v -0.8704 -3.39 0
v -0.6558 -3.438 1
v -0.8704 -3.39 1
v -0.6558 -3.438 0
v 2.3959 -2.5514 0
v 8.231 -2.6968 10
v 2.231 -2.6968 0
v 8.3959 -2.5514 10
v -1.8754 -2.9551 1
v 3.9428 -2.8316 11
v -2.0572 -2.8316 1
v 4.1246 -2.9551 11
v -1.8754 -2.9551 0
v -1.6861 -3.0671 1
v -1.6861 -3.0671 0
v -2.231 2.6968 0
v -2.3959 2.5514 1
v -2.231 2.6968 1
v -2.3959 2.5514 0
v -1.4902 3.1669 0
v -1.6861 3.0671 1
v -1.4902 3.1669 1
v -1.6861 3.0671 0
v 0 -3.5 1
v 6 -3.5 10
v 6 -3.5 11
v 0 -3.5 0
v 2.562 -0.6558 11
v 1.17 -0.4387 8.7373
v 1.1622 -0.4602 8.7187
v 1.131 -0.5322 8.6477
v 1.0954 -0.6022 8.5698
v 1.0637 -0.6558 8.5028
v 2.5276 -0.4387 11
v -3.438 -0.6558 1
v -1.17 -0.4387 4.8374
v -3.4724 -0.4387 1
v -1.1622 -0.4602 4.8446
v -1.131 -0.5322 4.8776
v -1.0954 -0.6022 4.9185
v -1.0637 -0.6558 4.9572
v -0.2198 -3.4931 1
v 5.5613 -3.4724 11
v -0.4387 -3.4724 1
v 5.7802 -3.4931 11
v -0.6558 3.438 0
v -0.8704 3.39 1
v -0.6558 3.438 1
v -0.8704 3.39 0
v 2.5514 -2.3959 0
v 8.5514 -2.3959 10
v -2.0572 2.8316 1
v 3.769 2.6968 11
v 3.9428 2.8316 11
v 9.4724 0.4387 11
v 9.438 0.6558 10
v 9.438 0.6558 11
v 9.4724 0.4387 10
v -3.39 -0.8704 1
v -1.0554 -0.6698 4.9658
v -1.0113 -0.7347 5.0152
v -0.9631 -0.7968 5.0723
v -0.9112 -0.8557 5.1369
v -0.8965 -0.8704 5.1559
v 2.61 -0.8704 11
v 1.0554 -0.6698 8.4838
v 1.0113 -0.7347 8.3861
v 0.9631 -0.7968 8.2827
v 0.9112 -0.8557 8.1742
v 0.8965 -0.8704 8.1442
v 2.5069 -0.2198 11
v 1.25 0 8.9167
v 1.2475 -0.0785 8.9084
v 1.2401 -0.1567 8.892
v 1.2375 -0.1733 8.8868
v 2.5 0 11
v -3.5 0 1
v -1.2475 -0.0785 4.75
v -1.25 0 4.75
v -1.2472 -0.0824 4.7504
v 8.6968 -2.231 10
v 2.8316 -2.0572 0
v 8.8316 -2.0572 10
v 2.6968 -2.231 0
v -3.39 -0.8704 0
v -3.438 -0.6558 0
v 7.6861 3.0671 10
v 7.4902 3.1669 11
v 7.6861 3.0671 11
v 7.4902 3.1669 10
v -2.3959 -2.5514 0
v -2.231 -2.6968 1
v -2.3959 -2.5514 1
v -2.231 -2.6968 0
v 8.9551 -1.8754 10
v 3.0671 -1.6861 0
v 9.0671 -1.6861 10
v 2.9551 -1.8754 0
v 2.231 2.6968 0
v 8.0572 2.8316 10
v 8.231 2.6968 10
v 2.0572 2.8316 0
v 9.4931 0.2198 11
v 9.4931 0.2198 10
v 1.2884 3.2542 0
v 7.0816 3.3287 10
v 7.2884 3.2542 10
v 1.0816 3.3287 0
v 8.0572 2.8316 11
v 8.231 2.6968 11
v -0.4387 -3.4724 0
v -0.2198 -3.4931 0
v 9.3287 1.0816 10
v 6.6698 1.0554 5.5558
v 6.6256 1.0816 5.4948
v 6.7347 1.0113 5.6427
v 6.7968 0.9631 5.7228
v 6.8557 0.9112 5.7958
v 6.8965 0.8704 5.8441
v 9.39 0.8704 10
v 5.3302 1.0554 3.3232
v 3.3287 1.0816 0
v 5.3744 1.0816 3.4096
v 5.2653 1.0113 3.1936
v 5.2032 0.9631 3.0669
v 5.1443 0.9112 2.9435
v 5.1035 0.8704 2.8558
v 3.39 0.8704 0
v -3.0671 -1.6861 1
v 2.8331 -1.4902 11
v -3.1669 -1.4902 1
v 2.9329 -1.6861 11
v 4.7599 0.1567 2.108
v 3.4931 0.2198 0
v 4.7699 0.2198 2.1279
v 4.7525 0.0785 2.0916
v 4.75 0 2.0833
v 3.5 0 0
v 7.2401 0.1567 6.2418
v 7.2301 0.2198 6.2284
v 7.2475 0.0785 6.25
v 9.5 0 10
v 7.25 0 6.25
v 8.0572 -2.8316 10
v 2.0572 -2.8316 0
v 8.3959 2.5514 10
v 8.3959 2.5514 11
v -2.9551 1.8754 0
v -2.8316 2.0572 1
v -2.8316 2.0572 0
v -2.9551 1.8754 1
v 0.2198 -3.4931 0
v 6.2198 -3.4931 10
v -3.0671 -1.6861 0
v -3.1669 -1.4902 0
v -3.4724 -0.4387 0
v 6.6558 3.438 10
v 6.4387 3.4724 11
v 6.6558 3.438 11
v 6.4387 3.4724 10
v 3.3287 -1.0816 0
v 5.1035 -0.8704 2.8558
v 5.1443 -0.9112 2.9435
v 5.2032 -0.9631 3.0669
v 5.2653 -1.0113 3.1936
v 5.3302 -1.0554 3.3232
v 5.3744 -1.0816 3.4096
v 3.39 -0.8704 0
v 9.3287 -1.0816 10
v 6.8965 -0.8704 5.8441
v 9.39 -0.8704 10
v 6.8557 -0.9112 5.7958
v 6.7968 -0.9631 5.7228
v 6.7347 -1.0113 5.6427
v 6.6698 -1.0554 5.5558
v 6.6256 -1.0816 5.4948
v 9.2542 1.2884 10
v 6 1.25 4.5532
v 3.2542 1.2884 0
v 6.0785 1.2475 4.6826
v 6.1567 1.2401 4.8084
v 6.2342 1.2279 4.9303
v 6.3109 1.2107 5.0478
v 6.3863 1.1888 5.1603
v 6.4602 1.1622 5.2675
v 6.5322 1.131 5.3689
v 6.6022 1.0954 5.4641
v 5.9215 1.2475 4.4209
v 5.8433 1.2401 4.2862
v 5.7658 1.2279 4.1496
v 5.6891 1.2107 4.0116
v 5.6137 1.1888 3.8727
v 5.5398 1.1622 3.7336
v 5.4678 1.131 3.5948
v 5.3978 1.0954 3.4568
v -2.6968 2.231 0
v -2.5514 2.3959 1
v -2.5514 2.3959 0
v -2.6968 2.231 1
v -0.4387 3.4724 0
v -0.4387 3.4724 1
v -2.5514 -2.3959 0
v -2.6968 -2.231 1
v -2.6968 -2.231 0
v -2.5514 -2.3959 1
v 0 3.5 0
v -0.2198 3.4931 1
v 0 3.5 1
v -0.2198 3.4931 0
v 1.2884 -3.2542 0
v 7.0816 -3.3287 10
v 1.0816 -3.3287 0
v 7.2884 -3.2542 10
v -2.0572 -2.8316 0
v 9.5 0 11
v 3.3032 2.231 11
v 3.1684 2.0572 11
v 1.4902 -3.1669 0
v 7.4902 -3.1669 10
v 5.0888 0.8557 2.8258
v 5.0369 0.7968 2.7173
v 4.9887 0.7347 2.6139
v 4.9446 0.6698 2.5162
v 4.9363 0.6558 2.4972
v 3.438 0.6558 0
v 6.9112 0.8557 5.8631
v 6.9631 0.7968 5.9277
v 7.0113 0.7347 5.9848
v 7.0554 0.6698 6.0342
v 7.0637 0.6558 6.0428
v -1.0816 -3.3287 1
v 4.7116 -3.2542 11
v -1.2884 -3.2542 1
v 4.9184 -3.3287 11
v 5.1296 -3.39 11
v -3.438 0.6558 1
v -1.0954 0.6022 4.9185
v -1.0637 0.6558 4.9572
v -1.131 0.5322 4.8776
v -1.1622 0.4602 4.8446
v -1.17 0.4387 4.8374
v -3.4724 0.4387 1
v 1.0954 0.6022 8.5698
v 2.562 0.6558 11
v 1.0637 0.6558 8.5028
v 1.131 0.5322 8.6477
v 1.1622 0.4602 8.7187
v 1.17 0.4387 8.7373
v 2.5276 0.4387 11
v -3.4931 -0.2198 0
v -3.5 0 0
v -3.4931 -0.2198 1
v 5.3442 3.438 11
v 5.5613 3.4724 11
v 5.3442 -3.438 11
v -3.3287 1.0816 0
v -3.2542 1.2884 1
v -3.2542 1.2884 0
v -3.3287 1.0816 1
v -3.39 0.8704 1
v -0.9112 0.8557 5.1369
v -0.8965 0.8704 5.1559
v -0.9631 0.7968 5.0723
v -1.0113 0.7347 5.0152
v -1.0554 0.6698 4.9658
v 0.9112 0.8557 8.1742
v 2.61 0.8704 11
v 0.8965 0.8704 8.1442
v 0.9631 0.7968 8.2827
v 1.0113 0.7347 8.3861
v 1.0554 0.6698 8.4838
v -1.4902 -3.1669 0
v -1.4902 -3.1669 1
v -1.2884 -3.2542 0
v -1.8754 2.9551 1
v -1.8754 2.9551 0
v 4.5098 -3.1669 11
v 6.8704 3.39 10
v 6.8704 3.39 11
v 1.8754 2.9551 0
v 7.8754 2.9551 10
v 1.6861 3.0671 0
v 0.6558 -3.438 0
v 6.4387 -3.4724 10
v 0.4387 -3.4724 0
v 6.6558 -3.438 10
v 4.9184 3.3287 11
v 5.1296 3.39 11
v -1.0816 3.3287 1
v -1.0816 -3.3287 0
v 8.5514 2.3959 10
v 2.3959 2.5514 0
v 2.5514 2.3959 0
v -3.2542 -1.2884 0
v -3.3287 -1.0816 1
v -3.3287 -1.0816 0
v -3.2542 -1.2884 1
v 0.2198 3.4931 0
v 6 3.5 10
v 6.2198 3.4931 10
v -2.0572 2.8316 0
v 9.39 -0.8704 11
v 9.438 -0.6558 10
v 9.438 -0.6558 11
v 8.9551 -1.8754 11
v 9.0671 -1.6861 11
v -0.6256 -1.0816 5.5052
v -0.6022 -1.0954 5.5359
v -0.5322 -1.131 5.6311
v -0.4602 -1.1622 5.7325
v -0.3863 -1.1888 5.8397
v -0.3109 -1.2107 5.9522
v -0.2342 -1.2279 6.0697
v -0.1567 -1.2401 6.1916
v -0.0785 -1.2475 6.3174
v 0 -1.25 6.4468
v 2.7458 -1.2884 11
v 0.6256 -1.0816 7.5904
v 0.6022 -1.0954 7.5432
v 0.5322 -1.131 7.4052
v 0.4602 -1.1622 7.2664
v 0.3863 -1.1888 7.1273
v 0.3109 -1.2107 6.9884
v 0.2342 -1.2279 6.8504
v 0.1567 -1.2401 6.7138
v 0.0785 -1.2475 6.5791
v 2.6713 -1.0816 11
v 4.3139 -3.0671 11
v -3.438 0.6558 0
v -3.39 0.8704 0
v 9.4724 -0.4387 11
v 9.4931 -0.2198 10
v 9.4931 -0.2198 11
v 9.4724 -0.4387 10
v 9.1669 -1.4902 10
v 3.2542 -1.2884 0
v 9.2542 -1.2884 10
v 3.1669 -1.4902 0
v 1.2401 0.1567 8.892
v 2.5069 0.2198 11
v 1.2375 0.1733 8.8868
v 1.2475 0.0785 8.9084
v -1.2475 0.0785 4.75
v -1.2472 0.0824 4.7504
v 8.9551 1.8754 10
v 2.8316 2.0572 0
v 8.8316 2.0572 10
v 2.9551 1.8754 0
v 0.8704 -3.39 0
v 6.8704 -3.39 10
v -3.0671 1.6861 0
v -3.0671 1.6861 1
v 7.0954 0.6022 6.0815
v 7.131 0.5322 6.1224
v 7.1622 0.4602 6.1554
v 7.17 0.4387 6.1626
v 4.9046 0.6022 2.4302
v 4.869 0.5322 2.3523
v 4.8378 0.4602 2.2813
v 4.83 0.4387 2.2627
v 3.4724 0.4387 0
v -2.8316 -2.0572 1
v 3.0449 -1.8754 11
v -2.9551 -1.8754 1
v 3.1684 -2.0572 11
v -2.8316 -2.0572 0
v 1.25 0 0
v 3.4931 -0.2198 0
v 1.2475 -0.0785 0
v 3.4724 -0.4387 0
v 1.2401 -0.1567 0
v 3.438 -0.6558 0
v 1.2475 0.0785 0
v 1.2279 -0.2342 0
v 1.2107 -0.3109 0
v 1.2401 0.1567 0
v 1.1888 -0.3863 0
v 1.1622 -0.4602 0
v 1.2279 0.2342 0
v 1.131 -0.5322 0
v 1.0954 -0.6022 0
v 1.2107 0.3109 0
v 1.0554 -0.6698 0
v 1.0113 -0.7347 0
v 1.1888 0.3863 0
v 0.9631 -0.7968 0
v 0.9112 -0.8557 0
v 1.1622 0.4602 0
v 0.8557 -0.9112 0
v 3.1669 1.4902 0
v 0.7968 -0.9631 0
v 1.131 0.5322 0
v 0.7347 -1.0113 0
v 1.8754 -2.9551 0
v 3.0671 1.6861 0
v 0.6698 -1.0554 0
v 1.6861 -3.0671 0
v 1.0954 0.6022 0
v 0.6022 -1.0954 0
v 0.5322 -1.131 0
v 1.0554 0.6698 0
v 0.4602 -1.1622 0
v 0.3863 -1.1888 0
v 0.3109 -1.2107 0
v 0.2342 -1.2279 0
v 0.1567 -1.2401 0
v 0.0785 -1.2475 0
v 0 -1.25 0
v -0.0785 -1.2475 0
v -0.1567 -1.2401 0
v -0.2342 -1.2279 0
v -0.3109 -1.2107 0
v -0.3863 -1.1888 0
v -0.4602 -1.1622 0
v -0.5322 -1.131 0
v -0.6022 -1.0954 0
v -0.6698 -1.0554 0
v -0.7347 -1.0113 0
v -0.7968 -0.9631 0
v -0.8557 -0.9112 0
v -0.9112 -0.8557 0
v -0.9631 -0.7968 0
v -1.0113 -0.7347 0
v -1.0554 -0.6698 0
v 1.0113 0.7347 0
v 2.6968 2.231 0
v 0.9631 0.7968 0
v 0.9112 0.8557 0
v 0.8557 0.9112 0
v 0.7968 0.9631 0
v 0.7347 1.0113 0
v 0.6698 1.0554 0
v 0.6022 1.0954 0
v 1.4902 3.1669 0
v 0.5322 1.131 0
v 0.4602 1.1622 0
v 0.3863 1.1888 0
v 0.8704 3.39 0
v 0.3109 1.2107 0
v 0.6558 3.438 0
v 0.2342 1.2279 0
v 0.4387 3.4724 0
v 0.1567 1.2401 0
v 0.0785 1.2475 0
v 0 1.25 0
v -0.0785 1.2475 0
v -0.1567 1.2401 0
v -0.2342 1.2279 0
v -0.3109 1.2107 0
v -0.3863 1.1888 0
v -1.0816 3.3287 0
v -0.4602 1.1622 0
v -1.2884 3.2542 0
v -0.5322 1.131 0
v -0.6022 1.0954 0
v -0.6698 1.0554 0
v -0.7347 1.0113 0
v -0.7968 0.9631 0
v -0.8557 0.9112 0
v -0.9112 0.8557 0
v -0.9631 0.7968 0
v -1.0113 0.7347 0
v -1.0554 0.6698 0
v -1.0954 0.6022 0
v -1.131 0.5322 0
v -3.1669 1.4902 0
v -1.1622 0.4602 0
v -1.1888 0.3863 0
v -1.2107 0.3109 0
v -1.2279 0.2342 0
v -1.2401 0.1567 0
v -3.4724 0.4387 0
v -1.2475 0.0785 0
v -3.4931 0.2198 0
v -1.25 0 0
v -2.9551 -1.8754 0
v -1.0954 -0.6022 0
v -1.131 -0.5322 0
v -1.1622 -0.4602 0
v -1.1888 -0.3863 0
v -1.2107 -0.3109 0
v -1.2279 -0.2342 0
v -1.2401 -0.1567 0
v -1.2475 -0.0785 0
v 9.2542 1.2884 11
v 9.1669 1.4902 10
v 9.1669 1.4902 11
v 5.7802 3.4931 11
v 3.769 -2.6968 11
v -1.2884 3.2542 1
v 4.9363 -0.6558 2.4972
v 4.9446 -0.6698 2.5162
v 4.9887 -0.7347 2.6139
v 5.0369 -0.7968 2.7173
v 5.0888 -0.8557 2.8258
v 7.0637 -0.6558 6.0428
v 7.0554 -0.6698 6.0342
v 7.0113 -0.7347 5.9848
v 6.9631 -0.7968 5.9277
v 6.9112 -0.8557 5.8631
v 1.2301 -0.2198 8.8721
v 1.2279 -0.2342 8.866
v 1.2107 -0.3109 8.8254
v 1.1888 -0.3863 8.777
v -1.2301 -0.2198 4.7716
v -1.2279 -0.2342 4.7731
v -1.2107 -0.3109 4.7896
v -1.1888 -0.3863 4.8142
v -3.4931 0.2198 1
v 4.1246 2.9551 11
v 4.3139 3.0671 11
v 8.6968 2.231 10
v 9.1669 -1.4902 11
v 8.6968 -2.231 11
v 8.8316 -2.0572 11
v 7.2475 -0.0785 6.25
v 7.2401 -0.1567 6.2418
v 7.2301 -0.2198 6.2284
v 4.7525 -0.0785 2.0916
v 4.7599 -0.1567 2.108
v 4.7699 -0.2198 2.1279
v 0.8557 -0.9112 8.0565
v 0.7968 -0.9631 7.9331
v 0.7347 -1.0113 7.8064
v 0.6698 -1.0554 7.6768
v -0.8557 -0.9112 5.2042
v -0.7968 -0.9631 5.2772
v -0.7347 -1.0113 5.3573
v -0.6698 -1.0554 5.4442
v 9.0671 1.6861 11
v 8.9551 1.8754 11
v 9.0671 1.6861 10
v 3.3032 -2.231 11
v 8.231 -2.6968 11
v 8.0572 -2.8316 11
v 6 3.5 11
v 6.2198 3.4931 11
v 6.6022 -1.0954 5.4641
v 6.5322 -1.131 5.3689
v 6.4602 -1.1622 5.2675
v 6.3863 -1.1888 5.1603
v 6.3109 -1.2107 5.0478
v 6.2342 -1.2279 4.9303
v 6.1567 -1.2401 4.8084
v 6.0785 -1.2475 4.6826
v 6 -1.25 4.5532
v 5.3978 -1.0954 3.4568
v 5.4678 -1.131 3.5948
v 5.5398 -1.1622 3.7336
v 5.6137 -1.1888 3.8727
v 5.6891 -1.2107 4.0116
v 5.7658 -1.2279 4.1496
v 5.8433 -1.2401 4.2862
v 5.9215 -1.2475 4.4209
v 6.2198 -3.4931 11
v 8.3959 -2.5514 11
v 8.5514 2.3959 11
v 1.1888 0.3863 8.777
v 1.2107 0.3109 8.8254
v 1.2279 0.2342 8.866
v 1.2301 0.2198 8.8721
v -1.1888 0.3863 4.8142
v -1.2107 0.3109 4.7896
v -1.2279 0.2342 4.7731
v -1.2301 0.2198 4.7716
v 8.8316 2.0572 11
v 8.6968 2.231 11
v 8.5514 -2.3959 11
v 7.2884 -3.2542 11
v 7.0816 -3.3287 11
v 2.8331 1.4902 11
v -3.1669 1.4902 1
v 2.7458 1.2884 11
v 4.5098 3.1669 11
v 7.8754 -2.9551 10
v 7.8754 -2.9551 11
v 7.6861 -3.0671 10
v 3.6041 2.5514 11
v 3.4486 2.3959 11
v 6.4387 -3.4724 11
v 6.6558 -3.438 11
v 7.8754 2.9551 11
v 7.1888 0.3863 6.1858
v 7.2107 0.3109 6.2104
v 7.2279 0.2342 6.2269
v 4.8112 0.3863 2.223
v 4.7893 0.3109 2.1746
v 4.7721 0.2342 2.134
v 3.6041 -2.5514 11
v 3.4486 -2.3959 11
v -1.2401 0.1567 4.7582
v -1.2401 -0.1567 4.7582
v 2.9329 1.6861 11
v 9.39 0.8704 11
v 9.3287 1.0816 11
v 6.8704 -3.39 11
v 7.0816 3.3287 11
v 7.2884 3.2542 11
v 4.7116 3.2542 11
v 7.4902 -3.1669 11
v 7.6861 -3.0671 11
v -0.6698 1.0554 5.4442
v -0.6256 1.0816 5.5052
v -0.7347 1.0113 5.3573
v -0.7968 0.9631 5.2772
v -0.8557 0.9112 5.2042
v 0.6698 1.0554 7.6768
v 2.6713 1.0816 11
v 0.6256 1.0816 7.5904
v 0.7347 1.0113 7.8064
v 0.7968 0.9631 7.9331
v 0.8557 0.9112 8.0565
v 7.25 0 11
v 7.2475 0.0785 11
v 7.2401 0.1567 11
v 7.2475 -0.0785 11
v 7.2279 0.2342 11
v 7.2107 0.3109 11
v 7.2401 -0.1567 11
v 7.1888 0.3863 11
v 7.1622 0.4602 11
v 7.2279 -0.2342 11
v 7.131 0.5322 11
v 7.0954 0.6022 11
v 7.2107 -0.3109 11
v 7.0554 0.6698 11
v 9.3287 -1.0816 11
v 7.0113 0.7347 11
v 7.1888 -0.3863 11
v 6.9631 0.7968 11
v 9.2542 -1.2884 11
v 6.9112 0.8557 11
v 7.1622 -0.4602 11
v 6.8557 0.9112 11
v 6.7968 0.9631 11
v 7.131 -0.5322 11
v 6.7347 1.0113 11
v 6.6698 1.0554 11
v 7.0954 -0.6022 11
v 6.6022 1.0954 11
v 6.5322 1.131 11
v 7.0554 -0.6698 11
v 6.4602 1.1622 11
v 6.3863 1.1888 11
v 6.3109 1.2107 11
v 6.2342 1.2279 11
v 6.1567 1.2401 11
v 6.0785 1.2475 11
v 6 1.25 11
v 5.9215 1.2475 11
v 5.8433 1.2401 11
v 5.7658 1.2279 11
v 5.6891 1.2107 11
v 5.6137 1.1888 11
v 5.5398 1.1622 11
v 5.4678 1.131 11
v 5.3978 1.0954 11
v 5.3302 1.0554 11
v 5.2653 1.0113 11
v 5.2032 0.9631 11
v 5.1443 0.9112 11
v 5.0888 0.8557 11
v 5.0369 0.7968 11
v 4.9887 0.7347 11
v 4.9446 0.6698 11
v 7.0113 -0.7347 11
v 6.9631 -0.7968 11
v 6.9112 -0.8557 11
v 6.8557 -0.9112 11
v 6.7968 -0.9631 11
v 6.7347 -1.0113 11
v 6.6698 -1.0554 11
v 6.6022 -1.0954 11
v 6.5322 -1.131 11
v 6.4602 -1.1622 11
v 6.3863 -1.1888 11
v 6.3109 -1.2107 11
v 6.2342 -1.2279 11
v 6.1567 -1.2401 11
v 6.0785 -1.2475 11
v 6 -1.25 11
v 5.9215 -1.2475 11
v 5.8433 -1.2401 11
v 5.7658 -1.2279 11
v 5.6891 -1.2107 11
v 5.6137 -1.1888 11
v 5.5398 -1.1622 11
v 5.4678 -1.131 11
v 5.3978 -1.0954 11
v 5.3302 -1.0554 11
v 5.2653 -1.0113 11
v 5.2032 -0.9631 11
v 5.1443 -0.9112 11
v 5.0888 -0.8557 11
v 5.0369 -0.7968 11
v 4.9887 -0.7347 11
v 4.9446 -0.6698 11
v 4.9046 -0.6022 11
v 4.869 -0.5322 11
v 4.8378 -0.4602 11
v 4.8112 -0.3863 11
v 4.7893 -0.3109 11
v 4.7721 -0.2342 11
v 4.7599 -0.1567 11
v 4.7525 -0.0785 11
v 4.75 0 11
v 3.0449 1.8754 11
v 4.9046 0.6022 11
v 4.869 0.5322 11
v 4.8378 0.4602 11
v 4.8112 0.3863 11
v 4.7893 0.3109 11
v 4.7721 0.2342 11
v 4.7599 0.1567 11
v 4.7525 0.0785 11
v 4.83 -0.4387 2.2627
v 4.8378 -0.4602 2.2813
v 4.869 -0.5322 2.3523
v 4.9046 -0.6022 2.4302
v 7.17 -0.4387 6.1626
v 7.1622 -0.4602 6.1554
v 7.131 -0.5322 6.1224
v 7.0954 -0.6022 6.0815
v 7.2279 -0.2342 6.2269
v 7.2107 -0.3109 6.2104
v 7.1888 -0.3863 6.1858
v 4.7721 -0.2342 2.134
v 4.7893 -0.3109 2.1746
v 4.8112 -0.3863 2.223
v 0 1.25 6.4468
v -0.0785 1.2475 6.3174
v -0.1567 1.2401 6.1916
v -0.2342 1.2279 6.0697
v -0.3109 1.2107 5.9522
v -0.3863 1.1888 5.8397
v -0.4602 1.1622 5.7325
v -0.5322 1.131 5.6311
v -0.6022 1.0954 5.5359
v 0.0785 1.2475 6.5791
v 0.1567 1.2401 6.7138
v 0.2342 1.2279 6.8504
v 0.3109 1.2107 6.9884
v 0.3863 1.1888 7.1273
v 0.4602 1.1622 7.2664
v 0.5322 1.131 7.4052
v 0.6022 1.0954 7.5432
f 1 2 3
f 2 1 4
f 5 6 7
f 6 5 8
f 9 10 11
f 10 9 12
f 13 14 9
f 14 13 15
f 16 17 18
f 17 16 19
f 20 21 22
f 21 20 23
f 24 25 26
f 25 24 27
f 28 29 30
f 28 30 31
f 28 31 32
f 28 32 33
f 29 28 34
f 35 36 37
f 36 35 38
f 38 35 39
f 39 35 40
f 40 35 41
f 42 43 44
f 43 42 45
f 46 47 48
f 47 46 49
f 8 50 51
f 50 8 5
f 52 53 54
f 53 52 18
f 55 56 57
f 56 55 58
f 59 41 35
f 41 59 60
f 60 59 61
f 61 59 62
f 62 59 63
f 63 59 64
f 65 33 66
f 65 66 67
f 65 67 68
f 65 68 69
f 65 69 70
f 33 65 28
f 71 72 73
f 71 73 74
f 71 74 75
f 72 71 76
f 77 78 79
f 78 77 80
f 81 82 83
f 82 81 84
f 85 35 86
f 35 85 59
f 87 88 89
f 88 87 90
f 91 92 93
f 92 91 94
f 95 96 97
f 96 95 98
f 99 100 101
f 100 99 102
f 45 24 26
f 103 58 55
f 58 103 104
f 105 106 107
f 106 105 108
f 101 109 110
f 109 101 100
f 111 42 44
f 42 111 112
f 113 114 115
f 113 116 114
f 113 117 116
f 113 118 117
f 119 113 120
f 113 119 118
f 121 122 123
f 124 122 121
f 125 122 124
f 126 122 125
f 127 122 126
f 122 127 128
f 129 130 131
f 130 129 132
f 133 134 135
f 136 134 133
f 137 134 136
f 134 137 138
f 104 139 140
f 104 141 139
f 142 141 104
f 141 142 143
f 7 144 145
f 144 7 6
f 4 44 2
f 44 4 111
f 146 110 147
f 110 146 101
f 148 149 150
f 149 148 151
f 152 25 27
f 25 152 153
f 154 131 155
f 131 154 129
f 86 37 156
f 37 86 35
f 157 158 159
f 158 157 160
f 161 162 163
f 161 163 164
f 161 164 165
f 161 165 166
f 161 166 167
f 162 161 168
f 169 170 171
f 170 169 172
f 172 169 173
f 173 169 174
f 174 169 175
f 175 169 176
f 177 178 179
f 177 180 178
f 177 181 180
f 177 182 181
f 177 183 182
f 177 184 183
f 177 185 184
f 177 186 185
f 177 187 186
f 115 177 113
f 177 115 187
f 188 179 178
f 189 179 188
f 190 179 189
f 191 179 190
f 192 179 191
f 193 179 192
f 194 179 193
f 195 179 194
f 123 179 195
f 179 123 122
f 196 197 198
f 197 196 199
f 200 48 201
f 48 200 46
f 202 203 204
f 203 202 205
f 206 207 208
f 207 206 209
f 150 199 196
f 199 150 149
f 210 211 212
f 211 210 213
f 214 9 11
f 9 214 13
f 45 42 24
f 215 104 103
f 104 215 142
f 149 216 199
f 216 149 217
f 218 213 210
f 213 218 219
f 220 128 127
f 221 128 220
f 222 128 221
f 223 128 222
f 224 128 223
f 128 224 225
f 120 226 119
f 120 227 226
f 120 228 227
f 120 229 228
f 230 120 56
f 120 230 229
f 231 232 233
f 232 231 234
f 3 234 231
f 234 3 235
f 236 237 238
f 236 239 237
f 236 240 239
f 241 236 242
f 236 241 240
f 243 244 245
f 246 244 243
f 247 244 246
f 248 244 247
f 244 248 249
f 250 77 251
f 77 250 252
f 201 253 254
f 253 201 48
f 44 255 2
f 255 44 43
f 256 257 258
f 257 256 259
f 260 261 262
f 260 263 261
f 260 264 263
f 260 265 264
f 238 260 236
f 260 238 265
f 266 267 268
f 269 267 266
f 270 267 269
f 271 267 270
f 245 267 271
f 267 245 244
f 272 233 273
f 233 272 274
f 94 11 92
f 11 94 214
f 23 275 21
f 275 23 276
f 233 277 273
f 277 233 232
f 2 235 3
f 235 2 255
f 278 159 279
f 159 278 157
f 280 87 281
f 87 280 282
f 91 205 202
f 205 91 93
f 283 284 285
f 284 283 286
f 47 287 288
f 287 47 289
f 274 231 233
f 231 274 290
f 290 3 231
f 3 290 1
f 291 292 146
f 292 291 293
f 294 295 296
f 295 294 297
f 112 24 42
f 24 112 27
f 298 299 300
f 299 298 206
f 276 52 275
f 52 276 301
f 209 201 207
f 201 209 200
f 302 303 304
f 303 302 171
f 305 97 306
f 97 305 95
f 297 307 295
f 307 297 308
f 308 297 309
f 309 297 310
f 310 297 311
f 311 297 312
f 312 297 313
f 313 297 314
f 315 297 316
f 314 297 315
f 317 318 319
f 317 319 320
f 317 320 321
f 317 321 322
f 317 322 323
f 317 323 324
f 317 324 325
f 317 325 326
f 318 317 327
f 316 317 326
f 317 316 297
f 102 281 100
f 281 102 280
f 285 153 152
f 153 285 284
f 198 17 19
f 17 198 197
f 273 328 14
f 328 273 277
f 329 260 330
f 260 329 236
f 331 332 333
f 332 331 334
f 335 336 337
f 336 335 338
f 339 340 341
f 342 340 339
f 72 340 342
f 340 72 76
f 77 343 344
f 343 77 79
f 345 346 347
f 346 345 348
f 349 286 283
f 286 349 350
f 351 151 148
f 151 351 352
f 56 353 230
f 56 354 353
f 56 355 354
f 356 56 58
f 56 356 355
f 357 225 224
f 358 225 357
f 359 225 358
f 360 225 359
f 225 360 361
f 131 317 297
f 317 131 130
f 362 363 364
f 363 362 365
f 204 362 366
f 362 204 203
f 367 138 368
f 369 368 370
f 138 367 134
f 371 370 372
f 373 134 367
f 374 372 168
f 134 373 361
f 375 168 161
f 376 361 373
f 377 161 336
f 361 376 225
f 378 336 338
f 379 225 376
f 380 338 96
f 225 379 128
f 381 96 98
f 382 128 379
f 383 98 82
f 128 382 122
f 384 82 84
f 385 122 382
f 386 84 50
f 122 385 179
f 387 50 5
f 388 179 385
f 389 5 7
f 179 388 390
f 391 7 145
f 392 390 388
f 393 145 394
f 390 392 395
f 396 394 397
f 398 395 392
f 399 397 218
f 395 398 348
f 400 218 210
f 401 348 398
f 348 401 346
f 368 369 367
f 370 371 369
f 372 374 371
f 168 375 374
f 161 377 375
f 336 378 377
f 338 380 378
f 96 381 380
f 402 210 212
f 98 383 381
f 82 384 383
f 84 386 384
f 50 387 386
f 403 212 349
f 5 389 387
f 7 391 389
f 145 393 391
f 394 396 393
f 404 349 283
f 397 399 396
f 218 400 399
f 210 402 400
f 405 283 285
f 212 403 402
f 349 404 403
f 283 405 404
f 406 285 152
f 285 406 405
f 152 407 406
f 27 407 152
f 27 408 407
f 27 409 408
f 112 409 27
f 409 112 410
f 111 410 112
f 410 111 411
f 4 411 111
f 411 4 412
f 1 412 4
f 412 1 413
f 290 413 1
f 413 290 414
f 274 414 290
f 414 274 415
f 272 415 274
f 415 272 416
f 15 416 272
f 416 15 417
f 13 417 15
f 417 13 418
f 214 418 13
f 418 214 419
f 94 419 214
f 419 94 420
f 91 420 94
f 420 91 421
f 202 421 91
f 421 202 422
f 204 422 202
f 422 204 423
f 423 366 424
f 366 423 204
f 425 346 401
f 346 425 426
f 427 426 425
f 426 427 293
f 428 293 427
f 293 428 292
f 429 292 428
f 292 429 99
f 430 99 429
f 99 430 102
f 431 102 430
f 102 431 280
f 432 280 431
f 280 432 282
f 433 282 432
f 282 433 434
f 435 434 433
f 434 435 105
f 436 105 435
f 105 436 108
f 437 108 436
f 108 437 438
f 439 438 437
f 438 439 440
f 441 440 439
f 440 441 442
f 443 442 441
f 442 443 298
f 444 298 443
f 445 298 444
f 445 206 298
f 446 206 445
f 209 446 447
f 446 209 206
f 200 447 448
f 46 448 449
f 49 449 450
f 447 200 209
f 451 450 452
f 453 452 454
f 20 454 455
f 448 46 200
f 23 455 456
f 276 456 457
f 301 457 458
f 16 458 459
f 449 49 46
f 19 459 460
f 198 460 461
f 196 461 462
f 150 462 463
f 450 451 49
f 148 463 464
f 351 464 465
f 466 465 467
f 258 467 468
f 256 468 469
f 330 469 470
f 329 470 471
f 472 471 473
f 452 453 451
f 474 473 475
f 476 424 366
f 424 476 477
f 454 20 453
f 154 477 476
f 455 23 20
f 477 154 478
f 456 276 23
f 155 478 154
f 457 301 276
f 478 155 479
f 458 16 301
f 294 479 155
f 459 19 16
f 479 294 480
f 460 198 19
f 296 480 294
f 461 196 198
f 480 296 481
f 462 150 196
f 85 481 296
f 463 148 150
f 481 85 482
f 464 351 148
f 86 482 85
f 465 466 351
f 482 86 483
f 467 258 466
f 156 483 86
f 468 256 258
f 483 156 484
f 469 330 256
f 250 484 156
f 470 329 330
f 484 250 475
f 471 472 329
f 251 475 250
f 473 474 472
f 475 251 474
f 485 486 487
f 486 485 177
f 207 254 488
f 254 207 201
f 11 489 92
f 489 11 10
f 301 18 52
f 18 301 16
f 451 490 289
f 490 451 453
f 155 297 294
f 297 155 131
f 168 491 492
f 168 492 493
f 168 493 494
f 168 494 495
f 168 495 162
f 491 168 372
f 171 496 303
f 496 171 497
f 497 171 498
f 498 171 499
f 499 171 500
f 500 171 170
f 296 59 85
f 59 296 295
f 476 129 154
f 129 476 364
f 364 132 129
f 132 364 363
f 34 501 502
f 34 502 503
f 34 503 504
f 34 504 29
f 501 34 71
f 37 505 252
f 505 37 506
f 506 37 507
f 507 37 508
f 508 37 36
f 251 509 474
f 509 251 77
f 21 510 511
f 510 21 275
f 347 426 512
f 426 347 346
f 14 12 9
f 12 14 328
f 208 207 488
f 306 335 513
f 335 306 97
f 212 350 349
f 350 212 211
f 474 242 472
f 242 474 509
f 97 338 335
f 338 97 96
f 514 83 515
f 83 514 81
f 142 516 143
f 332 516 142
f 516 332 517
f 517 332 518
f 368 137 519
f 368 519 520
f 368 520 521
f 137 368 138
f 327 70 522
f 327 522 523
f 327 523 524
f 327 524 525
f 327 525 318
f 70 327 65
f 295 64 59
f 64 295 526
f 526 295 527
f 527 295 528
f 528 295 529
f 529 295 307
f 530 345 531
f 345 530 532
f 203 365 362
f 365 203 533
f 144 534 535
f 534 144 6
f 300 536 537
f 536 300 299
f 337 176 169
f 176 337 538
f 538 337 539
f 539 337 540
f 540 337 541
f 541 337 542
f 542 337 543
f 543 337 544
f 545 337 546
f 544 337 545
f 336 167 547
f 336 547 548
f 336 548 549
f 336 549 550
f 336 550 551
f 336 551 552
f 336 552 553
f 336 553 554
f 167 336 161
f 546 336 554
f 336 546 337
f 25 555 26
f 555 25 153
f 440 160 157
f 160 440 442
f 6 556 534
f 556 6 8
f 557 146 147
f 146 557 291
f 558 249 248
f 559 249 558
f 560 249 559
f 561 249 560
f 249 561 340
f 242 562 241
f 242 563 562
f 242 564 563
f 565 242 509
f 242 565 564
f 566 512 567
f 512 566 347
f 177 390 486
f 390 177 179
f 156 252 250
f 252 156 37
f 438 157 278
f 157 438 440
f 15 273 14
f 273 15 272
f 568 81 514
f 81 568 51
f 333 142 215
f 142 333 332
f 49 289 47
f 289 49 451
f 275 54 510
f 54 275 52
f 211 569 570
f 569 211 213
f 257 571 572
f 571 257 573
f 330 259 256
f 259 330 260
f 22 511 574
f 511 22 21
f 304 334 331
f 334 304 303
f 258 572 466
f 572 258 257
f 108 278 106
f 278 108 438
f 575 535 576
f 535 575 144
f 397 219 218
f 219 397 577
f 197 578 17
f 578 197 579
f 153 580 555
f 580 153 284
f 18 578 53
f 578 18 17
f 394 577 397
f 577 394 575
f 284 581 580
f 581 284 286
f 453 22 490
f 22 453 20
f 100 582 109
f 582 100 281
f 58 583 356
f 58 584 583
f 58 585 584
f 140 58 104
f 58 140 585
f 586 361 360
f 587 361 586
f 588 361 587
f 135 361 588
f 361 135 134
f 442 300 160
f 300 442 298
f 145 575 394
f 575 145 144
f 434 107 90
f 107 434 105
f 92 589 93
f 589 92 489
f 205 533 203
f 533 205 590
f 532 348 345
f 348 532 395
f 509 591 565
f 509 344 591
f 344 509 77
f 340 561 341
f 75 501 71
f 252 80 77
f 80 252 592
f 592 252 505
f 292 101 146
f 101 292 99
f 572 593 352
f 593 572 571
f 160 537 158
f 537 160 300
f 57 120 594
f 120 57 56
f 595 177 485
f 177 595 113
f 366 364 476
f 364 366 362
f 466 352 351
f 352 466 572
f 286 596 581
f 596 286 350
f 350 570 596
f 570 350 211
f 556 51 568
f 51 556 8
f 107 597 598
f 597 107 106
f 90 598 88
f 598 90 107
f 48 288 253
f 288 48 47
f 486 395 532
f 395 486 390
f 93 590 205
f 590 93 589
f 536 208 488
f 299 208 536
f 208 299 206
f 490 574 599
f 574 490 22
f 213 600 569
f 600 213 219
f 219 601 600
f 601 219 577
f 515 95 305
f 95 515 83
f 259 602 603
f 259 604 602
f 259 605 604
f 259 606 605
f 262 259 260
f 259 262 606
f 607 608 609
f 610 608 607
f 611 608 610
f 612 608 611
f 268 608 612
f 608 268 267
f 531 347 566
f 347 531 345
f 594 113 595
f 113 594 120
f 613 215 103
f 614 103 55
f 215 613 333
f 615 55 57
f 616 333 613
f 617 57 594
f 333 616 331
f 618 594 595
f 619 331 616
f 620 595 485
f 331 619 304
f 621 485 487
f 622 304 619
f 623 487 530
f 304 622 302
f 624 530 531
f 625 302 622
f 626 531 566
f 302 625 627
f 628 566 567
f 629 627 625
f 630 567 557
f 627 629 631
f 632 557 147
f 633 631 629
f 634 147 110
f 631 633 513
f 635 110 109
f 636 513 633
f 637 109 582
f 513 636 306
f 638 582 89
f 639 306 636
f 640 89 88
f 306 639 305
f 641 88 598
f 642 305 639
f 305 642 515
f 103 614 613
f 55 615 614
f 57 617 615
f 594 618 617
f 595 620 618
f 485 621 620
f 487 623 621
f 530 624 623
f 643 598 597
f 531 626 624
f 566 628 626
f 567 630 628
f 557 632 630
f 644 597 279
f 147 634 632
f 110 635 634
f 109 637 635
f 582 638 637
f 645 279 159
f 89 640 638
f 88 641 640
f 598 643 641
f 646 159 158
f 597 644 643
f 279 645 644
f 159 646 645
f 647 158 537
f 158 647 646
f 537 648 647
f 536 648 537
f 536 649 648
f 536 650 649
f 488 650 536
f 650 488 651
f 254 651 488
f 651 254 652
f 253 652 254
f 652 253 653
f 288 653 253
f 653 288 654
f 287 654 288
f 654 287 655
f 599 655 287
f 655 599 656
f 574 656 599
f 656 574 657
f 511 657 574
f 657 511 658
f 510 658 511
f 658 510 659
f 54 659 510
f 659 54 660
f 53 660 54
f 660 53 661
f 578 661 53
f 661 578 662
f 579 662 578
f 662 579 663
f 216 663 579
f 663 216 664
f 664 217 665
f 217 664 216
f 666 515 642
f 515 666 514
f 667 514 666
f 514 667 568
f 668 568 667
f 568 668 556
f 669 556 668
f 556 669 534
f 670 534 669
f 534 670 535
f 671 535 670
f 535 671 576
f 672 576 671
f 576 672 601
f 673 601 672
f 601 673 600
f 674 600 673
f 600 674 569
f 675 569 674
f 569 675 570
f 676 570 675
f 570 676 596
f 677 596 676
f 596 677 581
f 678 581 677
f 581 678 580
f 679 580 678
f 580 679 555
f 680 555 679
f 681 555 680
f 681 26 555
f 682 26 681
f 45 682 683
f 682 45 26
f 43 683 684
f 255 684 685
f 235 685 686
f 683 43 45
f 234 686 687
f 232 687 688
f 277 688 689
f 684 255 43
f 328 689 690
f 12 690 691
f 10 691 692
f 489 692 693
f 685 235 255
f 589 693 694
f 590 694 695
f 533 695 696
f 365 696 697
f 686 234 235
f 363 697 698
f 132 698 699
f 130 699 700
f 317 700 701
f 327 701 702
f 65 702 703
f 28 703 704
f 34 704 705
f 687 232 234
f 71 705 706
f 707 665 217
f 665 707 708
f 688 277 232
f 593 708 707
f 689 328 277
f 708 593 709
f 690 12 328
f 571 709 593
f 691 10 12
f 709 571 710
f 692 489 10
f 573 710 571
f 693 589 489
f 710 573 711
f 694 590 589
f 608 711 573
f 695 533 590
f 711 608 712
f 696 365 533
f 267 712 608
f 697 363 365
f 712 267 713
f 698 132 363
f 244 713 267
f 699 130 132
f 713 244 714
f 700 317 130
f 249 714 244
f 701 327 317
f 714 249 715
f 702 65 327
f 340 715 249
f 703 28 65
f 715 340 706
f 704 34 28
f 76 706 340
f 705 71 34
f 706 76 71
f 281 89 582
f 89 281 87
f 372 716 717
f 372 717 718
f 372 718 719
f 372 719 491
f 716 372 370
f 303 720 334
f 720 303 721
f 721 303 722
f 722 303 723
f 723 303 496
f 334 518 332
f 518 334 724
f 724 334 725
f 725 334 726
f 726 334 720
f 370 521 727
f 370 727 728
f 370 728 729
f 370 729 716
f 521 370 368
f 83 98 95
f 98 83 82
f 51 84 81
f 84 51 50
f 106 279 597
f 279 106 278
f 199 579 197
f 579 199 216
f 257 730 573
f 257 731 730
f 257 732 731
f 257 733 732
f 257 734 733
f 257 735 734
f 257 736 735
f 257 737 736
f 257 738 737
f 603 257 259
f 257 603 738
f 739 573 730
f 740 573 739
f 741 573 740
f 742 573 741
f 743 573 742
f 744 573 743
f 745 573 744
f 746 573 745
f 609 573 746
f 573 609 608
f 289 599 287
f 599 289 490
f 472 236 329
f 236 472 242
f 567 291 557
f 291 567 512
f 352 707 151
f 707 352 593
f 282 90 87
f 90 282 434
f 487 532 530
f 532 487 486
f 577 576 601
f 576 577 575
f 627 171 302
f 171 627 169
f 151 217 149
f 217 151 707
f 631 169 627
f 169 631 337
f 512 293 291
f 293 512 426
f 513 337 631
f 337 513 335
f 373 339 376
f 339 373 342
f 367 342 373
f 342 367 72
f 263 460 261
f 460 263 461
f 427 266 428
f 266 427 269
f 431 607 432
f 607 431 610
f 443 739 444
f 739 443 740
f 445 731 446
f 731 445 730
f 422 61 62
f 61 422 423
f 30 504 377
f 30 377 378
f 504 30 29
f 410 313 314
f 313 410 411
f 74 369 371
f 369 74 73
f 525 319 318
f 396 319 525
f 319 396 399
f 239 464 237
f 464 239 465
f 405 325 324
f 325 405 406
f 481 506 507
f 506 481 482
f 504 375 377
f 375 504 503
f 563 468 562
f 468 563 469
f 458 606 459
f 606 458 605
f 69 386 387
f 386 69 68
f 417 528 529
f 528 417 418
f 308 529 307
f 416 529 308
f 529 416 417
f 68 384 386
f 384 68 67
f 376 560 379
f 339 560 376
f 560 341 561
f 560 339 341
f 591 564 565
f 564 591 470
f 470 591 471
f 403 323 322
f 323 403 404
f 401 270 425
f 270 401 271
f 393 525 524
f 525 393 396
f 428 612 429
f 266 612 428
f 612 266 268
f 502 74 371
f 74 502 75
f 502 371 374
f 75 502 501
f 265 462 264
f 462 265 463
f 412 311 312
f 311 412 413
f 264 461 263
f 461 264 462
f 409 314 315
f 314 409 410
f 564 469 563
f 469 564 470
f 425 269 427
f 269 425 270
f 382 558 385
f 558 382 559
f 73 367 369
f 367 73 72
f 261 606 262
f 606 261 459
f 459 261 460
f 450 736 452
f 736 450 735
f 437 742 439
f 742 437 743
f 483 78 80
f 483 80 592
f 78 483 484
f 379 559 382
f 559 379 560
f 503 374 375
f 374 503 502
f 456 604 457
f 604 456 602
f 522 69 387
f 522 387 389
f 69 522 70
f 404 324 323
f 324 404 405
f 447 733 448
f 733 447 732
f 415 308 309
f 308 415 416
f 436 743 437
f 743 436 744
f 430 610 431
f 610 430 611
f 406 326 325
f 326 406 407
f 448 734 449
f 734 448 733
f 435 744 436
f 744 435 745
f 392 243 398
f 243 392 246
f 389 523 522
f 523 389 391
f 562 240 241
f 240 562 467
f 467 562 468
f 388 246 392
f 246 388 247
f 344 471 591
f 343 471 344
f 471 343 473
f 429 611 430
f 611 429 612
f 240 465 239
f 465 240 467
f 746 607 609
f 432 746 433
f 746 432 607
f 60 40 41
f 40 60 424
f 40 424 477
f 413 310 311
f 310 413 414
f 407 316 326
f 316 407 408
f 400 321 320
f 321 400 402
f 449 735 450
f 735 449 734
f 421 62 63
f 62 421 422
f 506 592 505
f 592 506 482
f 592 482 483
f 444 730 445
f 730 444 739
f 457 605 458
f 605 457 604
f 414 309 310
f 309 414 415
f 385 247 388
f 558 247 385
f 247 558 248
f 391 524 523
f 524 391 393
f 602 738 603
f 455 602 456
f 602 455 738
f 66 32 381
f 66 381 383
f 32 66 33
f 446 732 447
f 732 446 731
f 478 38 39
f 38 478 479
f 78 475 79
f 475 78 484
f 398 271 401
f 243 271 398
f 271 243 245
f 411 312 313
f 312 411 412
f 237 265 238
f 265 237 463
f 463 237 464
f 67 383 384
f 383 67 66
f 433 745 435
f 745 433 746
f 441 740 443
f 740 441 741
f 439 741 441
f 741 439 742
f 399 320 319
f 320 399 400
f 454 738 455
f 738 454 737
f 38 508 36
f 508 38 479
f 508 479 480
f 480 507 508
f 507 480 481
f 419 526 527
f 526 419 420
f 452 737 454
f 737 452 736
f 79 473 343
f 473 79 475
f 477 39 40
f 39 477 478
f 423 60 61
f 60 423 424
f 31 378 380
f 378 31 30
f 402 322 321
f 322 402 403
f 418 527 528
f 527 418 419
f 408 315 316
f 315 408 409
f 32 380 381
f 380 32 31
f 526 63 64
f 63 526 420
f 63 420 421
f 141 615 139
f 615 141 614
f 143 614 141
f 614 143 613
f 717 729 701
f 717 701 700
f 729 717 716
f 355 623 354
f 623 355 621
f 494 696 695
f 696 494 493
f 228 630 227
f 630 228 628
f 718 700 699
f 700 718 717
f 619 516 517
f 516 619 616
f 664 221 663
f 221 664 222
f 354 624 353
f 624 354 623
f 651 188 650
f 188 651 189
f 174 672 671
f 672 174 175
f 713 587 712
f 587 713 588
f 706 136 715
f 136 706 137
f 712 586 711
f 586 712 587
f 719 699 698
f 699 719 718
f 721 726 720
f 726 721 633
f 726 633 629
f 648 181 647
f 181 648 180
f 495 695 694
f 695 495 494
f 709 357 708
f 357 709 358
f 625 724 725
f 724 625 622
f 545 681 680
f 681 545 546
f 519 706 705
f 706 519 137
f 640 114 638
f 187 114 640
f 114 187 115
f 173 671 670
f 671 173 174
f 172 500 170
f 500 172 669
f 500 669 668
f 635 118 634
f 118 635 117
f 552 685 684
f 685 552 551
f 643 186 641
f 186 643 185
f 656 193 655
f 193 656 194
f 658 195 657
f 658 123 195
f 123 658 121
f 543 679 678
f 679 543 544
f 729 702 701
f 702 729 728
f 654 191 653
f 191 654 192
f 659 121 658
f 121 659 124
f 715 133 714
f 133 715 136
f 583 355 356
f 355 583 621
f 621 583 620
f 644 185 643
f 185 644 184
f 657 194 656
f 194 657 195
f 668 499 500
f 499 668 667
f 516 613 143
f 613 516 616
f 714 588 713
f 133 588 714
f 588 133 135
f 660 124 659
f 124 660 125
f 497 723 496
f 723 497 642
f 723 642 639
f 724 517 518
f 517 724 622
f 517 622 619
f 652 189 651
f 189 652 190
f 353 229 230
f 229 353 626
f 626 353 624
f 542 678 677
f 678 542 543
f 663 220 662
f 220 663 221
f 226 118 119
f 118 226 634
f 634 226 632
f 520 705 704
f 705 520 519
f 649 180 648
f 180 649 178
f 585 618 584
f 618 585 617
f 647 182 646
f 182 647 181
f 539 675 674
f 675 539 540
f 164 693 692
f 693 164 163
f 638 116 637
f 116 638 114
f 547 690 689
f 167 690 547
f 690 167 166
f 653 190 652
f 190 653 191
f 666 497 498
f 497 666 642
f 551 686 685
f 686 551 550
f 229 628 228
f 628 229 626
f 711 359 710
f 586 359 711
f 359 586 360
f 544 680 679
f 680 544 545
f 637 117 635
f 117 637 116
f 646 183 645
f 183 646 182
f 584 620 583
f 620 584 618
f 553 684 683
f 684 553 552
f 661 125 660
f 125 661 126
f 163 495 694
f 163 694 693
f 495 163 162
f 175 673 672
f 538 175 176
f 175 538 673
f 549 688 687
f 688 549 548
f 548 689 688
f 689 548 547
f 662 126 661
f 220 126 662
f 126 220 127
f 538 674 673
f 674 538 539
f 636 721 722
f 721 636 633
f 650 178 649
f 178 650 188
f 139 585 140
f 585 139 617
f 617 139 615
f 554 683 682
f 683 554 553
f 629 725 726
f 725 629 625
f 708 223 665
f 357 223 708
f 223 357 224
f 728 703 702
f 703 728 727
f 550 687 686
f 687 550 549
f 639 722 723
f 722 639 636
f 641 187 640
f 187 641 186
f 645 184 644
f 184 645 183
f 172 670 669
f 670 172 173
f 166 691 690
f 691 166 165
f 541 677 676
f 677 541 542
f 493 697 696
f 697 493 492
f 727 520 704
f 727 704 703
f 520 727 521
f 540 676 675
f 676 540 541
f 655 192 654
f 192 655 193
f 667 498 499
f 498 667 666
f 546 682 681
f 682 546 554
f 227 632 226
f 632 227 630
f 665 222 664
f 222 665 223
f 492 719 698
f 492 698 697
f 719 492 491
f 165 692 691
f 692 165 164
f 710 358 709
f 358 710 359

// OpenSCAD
// Horizontal offset
horizontalOffset = 6; // [0:5]

// Vertical offset
verticalOffset = 10; // [0:50]

// Base cylinder height
baseHeight = 1; // [1, 2, 3]

// Hole diameter
holeDiameter = 2.5; // [3]

difference() {
    hull() {
        cylinder(baseHeight, 3.5, 3.5, $fn=100);
        translate([horizontalOffset, 0, verticalOffset]) cylinder(baseHeight, 3.5, 3.5, $fn=100);
    }
    translate([0, 0, -1]) cylinder(55, holeDiameter/2, holeDiameter/2, $fn=100);
    translate([horizontalOffset, 0, -1]) cylinder(55, holeDiameter/2, holeDiameter/2, $fn=100);
}
